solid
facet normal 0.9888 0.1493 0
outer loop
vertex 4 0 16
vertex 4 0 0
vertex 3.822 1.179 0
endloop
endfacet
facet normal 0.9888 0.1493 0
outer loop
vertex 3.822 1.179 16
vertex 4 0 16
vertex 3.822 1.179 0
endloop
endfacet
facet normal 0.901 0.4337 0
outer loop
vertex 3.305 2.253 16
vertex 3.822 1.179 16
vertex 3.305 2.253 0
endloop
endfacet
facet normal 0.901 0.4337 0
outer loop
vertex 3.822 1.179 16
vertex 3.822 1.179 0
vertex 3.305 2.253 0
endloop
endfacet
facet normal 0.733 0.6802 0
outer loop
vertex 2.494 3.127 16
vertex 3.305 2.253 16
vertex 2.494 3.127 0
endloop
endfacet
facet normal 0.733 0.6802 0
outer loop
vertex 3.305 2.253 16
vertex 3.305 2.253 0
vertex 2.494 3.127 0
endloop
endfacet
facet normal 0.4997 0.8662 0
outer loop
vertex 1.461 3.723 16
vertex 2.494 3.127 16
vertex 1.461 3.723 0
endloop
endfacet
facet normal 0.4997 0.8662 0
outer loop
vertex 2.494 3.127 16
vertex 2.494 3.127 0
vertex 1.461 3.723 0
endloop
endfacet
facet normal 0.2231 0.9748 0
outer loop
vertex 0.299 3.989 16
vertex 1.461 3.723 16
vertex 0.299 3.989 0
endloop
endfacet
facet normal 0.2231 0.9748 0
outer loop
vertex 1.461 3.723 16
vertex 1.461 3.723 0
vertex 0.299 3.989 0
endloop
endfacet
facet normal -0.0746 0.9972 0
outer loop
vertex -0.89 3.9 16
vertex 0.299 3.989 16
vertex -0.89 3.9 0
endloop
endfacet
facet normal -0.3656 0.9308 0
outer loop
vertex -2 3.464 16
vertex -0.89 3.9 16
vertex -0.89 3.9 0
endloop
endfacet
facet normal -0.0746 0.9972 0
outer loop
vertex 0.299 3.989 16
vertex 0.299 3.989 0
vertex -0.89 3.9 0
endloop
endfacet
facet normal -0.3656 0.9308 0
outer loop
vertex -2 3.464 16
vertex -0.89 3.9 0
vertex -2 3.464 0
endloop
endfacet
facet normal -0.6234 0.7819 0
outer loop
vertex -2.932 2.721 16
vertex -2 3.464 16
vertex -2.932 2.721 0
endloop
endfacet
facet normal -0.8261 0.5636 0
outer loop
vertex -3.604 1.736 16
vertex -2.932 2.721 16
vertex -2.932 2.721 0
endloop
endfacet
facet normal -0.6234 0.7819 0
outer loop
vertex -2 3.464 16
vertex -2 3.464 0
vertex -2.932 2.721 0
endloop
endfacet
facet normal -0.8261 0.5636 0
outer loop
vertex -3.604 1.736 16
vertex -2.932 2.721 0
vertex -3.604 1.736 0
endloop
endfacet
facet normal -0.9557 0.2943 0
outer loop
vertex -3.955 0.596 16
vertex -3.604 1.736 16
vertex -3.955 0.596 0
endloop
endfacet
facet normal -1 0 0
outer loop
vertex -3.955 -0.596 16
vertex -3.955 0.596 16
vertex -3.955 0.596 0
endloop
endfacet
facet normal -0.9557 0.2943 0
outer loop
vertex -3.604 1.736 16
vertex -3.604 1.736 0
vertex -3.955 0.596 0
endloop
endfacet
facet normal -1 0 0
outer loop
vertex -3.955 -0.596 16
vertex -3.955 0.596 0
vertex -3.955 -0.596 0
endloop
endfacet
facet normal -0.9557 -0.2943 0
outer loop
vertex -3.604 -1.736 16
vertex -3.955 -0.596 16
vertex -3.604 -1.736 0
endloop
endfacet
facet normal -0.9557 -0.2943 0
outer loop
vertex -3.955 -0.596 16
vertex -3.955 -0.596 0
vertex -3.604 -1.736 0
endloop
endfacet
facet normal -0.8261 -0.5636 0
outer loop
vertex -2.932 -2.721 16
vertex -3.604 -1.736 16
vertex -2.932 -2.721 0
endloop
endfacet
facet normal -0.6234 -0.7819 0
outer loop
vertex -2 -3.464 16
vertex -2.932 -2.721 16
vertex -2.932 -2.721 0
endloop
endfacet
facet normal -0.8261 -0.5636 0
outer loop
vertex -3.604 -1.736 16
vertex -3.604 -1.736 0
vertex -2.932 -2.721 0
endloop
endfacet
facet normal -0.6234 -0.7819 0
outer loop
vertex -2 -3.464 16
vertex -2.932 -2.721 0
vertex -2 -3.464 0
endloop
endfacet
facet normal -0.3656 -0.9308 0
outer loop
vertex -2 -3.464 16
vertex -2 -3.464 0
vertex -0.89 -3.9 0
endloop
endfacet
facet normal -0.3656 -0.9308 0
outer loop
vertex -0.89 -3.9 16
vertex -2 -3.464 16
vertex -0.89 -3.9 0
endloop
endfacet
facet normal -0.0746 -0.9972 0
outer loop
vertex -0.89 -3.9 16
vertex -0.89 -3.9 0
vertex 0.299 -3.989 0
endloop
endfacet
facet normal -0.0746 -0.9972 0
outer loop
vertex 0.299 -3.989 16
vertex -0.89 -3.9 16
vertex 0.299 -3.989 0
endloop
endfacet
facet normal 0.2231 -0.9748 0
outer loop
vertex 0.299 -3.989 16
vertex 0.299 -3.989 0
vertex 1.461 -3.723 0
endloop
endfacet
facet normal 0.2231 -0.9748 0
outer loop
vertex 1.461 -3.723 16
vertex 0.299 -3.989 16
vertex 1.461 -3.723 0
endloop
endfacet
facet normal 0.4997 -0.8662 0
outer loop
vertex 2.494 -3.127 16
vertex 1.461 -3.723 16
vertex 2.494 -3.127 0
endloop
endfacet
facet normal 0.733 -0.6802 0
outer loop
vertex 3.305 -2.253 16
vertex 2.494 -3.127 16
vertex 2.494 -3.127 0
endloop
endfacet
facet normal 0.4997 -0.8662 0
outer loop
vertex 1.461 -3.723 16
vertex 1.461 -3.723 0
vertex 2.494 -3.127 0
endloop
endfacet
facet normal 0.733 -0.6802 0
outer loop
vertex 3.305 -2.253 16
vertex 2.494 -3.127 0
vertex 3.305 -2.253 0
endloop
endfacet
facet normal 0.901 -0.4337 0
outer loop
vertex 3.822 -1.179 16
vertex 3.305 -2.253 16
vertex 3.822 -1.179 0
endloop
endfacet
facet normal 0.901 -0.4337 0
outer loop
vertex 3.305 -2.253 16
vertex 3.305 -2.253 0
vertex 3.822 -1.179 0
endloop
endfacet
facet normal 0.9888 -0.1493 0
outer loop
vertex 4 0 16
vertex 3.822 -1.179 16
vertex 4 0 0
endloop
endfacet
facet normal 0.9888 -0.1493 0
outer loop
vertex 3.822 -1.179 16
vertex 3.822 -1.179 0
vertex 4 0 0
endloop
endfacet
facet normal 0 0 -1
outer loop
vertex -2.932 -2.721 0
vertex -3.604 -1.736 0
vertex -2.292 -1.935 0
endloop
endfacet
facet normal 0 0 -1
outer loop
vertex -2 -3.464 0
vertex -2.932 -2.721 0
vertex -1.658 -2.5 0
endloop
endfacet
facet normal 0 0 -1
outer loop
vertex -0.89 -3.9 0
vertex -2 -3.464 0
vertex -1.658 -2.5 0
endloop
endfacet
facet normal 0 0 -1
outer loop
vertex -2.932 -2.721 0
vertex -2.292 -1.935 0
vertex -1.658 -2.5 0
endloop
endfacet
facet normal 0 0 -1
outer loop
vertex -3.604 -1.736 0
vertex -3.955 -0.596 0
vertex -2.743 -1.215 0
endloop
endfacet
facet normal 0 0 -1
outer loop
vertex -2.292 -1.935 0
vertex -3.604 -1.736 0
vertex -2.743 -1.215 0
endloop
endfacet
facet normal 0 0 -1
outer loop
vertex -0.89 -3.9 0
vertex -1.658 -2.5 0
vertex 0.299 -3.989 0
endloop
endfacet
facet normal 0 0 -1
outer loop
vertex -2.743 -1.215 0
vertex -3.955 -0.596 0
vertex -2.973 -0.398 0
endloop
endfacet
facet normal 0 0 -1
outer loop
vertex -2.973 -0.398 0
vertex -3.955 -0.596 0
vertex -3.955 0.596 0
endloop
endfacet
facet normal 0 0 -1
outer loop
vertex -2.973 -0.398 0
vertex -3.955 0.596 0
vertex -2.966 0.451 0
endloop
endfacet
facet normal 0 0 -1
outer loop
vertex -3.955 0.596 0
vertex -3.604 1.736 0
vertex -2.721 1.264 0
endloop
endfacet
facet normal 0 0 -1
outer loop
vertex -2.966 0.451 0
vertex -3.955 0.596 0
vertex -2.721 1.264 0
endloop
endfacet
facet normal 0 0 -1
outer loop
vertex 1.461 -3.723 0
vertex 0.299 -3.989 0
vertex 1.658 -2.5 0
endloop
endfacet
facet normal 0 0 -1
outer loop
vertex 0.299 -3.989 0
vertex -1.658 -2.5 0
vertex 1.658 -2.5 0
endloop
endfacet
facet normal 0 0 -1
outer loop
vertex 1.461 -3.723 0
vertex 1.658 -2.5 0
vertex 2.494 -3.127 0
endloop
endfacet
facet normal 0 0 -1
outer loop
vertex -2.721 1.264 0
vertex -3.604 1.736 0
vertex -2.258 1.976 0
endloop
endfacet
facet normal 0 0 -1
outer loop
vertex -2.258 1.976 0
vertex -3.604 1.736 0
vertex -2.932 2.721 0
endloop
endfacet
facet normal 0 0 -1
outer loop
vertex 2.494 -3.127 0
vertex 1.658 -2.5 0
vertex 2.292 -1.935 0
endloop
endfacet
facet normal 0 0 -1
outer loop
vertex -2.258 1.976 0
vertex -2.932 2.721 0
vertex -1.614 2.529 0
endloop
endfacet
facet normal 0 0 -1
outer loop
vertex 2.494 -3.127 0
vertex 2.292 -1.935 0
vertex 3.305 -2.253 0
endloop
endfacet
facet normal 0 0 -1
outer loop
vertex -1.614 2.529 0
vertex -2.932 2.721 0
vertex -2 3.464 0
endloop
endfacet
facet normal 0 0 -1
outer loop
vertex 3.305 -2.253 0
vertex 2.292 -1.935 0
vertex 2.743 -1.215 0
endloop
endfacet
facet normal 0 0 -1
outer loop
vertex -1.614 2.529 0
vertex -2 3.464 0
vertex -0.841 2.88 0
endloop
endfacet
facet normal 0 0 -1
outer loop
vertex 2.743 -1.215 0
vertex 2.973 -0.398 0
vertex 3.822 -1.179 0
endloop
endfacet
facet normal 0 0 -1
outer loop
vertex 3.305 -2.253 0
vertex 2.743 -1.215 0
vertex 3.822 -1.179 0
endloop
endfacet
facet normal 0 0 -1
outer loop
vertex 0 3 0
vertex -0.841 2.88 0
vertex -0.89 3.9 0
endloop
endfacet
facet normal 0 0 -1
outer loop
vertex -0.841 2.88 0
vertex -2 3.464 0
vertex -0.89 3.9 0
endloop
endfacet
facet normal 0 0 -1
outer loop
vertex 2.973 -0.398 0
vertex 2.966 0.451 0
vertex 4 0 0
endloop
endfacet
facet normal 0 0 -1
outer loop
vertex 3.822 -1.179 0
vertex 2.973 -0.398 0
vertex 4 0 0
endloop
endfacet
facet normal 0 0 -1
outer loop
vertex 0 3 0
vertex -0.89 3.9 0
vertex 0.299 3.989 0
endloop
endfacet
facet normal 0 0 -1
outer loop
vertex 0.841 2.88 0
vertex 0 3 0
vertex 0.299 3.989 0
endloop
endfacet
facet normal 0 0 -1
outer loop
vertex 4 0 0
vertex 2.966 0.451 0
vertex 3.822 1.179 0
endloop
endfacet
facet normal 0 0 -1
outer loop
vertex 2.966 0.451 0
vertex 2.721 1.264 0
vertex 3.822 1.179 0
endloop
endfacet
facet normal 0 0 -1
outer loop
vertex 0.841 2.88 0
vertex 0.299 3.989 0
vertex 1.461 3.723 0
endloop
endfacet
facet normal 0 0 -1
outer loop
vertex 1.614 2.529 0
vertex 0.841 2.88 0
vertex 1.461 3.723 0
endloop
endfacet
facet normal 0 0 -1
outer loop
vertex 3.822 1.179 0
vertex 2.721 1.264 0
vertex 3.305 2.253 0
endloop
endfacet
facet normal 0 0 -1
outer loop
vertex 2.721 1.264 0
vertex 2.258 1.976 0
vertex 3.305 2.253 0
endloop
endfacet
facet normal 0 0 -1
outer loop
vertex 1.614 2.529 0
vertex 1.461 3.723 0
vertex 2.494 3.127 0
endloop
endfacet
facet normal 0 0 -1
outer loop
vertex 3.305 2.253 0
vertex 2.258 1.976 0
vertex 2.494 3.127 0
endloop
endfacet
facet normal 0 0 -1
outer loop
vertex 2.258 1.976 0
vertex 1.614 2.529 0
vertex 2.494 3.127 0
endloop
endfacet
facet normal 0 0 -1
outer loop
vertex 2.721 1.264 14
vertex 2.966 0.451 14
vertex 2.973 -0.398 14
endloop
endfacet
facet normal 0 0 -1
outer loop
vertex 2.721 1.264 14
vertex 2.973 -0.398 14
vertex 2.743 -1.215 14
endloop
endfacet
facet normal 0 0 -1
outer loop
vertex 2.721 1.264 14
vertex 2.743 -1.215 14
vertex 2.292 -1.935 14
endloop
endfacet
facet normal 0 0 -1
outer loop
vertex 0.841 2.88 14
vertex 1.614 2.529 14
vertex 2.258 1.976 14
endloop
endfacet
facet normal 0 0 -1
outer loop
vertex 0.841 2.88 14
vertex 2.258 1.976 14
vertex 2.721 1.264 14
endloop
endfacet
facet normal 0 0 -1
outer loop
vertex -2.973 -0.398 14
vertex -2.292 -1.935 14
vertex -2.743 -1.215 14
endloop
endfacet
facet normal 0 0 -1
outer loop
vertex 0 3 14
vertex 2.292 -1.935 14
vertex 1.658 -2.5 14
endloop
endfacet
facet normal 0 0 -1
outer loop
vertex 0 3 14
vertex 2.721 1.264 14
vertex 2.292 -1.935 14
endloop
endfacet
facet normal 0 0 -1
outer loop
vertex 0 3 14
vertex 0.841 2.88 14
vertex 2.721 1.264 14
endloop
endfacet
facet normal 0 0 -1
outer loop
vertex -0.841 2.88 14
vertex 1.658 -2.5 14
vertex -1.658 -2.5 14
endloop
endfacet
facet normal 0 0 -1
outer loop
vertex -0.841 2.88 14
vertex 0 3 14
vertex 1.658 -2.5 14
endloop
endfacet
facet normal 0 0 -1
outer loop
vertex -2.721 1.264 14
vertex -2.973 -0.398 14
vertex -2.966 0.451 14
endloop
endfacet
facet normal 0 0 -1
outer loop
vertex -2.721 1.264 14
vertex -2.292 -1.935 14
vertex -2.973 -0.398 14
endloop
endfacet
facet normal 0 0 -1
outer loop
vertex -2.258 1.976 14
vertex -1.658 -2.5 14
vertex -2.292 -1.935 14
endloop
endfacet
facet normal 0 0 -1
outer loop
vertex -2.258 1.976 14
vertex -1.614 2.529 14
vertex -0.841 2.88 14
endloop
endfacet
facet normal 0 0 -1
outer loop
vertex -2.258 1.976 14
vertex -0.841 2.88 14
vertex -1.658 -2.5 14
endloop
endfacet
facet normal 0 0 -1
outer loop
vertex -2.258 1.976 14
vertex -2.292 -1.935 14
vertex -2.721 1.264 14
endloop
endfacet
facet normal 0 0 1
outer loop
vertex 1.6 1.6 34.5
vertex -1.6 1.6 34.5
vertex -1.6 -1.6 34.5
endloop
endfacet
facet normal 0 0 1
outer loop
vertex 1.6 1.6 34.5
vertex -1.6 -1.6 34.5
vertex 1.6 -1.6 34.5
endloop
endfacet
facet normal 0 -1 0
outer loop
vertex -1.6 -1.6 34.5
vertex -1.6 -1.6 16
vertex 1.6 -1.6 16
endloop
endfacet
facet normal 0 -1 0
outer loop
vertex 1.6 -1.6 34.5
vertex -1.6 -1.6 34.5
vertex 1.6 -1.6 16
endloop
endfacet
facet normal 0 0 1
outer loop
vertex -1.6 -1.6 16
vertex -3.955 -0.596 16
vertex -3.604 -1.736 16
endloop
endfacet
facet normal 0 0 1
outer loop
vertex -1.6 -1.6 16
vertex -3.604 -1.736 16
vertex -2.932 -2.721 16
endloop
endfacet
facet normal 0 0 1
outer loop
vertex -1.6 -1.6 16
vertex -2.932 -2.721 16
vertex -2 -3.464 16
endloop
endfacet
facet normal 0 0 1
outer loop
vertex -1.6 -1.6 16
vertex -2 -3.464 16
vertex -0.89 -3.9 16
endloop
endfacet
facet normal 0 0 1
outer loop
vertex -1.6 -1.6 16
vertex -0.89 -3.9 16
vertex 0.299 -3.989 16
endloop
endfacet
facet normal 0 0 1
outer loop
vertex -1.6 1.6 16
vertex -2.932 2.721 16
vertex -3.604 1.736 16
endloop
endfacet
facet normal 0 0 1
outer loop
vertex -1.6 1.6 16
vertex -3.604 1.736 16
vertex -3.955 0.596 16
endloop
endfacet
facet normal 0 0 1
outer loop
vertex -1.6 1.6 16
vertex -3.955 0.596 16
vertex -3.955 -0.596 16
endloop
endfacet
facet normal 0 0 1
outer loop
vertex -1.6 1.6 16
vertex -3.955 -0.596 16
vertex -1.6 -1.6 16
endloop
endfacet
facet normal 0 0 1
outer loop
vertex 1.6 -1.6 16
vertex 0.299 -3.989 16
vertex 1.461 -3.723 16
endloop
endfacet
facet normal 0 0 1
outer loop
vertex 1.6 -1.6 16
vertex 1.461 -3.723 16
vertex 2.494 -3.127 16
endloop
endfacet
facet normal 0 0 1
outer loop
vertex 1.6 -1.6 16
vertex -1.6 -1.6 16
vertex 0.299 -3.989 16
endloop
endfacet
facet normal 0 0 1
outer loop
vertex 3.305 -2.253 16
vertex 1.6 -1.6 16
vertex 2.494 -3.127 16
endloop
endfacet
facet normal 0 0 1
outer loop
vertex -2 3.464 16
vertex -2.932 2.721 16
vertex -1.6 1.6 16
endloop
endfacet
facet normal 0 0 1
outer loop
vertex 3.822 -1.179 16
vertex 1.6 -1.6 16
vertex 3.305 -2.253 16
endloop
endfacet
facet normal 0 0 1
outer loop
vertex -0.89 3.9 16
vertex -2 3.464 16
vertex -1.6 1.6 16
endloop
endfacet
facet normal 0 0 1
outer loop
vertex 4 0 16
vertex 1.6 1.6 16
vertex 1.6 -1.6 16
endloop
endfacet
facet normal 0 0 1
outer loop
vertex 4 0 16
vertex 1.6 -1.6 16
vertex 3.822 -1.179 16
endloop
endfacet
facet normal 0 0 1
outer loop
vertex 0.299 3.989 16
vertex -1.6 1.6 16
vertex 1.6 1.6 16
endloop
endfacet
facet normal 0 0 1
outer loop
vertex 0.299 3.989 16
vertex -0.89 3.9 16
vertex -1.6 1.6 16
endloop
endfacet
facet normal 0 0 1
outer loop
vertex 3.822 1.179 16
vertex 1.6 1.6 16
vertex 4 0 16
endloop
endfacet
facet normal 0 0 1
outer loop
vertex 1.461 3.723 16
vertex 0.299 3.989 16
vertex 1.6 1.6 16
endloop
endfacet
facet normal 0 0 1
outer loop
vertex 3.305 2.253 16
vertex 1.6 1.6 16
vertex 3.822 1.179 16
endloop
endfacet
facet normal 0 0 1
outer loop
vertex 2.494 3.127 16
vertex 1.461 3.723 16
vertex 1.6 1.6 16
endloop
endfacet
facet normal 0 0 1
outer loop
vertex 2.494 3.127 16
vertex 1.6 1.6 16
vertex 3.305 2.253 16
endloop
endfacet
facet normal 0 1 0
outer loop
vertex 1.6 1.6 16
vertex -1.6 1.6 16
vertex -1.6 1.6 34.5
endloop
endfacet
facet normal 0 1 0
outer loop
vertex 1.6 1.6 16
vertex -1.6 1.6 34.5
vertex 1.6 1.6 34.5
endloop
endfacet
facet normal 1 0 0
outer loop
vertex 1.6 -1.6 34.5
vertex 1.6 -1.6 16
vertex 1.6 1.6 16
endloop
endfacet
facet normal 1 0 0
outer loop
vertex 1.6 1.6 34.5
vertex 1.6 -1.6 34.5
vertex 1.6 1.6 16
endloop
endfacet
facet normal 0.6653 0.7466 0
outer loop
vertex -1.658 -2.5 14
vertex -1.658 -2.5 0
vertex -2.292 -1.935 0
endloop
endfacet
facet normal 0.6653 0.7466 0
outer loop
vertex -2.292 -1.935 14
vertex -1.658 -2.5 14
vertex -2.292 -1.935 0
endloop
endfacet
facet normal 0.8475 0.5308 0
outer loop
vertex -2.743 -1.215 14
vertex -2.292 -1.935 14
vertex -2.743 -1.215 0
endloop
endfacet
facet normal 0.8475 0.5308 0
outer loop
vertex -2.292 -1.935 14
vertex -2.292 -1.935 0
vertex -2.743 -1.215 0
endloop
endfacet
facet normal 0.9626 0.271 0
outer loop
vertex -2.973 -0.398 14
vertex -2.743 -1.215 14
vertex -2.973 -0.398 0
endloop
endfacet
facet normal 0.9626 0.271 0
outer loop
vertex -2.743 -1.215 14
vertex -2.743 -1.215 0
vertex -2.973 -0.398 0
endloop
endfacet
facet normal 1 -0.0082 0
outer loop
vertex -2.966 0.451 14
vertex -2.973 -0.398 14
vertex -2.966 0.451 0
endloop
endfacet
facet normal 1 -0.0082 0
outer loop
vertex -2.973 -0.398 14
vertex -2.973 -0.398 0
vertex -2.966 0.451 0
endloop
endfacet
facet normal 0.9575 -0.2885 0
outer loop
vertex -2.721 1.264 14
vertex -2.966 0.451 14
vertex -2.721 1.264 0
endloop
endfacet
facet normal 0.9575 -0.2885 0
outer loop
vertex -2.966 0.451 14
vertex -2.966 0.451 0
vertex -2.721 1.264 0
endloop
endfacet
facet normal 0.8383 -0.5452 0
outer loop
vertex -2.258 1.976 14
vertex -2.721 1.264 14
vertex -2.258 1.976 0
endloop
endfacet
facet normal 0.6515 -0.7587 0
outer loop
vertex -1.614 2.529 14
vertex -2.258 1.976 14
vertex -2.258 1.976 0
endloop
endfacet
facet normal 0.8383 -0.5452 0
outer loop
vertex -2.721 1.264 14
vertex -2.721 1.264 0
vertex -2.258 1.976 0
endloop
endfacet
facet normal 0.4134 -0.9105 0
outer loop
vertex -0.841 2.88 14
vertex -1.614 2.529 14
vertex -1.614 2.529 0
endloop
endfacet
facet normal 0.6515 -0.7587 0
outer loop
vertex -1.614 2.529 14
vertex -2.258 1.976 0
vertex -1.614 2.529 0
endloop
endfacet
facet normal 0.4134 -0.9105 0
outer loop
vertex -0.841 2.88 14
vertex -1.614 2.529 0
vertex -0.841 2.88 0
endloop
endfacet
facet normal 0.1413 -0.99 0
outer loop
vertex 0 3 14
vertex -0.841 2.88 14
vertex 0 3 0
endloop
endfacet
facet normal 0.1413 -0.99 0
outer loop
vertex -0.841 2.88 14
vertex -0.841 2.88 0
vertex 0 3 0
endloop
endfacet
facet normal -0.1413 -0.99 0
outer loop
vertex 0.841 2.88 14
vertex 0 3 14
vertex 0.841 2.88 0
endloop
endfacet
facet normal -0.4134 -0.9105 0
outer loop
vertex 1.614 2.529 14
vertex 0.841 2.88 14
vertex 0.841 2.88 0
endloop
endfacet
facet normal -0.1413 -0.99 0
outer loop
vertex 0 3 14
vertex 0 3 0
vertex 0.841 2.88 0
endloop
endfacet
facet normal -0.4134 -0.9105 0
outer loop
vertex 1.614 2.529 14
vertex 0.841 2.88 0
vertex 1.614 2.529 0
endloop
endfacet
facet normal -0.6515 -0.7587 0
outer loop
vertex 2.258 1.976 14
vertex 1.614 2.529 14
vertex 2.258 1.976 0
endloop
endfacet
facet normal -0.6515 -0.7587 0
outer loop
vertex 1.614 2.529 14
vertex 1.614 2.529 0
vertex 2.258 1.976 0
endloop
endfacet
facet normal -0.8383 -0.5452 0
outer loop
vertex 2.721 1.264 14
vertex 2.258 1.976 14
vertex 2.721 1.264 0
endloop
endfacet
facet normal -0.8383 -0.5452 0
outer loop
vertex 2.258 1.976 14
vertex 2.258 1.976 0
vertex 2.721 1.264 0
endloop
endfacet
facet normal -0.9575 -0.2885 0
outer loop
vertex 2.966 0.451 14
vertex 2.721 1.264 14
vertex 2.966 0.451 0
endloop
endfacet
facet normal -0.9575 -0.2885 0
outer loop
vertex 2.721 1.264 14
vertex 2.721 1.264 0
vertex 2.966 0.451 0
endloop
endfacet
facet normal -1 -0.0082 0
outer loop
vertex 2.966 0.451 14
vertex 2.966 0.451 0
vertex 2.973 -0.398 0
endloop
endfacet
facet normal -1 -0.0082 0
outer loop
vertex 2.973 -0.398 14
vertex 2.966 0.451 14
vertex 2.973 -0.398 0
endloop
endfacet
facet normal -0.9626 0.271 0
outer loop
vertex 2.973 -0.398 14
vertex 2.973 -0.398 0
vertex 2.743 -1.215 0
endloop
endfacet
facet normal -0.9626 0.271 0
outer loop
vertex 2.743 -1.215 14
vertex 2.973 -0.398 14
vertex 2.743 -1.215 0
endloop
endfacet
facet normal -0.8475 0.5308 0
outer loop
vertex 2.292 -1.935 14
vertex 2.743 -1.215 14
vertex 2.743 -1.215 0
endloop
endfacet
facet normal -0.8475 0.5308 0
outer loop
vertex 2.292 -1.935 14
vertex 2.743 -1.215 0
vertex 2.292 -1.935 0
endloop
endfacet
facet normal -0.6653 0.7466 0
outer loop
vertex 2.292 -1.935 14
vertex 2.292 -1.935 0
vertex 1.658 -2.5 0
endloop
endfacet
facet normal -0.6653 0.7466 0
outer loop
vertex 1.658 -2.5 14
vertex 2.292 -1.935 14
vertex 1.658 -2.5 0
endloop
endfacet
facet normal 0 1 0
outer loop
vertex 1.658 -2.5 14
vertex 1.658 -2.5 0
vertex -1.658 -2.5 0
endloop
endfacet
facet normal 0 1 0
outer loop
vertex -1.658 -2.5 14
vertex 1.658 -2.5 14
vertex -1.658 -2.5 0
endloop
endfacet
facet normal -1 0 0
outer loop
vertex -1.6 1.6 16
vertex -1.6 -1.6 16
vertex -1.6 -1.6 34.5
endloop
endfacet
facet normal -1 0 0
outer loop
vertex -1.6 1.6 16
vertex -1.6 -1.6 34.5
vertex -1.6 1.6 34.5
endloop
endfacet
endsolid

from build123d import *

# Parameters (mm, degrees)
SKETCH1_R           = 4
BOSS_EXTRUDE1_DEPTH = 16
CUT_EXTRUDE3_DEPTH  = 14
SKETCH6_W           = 3.2
SKETCH6_H           = 3.2
BOSS_EXTRUDE2_DEPTH = 18.5


with BuildPart() as part:
    # Sketch1 → Boss-Extrude1 (new body)
    with BuildSketch(Plane.XY):
        Circle(SKETCH1_R)
    extrude(amount=BOSS_EXTRUDE1_DEPTH)

    # Sketch3 → Cut-Extrude3 (cut)
    with BuildSketch(Plane(origin=(0, 0, 0), x_dir=(-1, 0, 0), z_dir=(0, 0, -1))):
        with BuildLine():
            Line((-1.658312395, -2.5), (1.658312395, -2.5))
            ThreePointArc((1.658312395, -2.5), (0, 3), (-1.658312395, -2.5))
        make_face()
    extrude(amount=-CUT_EXTRUDE3_DEPTH, mode=Mode.SUBTRACT)

    # Sketch6 → Boss-Extrude2 (add)
    with BuildSketch(Plane.XY.offset(16)):
        Rectangle(SKETCH6_W, SKETCH6_H)
    extrude(amount=BOSS_EXTRUDE2_DEPTH)


solid = part.part
